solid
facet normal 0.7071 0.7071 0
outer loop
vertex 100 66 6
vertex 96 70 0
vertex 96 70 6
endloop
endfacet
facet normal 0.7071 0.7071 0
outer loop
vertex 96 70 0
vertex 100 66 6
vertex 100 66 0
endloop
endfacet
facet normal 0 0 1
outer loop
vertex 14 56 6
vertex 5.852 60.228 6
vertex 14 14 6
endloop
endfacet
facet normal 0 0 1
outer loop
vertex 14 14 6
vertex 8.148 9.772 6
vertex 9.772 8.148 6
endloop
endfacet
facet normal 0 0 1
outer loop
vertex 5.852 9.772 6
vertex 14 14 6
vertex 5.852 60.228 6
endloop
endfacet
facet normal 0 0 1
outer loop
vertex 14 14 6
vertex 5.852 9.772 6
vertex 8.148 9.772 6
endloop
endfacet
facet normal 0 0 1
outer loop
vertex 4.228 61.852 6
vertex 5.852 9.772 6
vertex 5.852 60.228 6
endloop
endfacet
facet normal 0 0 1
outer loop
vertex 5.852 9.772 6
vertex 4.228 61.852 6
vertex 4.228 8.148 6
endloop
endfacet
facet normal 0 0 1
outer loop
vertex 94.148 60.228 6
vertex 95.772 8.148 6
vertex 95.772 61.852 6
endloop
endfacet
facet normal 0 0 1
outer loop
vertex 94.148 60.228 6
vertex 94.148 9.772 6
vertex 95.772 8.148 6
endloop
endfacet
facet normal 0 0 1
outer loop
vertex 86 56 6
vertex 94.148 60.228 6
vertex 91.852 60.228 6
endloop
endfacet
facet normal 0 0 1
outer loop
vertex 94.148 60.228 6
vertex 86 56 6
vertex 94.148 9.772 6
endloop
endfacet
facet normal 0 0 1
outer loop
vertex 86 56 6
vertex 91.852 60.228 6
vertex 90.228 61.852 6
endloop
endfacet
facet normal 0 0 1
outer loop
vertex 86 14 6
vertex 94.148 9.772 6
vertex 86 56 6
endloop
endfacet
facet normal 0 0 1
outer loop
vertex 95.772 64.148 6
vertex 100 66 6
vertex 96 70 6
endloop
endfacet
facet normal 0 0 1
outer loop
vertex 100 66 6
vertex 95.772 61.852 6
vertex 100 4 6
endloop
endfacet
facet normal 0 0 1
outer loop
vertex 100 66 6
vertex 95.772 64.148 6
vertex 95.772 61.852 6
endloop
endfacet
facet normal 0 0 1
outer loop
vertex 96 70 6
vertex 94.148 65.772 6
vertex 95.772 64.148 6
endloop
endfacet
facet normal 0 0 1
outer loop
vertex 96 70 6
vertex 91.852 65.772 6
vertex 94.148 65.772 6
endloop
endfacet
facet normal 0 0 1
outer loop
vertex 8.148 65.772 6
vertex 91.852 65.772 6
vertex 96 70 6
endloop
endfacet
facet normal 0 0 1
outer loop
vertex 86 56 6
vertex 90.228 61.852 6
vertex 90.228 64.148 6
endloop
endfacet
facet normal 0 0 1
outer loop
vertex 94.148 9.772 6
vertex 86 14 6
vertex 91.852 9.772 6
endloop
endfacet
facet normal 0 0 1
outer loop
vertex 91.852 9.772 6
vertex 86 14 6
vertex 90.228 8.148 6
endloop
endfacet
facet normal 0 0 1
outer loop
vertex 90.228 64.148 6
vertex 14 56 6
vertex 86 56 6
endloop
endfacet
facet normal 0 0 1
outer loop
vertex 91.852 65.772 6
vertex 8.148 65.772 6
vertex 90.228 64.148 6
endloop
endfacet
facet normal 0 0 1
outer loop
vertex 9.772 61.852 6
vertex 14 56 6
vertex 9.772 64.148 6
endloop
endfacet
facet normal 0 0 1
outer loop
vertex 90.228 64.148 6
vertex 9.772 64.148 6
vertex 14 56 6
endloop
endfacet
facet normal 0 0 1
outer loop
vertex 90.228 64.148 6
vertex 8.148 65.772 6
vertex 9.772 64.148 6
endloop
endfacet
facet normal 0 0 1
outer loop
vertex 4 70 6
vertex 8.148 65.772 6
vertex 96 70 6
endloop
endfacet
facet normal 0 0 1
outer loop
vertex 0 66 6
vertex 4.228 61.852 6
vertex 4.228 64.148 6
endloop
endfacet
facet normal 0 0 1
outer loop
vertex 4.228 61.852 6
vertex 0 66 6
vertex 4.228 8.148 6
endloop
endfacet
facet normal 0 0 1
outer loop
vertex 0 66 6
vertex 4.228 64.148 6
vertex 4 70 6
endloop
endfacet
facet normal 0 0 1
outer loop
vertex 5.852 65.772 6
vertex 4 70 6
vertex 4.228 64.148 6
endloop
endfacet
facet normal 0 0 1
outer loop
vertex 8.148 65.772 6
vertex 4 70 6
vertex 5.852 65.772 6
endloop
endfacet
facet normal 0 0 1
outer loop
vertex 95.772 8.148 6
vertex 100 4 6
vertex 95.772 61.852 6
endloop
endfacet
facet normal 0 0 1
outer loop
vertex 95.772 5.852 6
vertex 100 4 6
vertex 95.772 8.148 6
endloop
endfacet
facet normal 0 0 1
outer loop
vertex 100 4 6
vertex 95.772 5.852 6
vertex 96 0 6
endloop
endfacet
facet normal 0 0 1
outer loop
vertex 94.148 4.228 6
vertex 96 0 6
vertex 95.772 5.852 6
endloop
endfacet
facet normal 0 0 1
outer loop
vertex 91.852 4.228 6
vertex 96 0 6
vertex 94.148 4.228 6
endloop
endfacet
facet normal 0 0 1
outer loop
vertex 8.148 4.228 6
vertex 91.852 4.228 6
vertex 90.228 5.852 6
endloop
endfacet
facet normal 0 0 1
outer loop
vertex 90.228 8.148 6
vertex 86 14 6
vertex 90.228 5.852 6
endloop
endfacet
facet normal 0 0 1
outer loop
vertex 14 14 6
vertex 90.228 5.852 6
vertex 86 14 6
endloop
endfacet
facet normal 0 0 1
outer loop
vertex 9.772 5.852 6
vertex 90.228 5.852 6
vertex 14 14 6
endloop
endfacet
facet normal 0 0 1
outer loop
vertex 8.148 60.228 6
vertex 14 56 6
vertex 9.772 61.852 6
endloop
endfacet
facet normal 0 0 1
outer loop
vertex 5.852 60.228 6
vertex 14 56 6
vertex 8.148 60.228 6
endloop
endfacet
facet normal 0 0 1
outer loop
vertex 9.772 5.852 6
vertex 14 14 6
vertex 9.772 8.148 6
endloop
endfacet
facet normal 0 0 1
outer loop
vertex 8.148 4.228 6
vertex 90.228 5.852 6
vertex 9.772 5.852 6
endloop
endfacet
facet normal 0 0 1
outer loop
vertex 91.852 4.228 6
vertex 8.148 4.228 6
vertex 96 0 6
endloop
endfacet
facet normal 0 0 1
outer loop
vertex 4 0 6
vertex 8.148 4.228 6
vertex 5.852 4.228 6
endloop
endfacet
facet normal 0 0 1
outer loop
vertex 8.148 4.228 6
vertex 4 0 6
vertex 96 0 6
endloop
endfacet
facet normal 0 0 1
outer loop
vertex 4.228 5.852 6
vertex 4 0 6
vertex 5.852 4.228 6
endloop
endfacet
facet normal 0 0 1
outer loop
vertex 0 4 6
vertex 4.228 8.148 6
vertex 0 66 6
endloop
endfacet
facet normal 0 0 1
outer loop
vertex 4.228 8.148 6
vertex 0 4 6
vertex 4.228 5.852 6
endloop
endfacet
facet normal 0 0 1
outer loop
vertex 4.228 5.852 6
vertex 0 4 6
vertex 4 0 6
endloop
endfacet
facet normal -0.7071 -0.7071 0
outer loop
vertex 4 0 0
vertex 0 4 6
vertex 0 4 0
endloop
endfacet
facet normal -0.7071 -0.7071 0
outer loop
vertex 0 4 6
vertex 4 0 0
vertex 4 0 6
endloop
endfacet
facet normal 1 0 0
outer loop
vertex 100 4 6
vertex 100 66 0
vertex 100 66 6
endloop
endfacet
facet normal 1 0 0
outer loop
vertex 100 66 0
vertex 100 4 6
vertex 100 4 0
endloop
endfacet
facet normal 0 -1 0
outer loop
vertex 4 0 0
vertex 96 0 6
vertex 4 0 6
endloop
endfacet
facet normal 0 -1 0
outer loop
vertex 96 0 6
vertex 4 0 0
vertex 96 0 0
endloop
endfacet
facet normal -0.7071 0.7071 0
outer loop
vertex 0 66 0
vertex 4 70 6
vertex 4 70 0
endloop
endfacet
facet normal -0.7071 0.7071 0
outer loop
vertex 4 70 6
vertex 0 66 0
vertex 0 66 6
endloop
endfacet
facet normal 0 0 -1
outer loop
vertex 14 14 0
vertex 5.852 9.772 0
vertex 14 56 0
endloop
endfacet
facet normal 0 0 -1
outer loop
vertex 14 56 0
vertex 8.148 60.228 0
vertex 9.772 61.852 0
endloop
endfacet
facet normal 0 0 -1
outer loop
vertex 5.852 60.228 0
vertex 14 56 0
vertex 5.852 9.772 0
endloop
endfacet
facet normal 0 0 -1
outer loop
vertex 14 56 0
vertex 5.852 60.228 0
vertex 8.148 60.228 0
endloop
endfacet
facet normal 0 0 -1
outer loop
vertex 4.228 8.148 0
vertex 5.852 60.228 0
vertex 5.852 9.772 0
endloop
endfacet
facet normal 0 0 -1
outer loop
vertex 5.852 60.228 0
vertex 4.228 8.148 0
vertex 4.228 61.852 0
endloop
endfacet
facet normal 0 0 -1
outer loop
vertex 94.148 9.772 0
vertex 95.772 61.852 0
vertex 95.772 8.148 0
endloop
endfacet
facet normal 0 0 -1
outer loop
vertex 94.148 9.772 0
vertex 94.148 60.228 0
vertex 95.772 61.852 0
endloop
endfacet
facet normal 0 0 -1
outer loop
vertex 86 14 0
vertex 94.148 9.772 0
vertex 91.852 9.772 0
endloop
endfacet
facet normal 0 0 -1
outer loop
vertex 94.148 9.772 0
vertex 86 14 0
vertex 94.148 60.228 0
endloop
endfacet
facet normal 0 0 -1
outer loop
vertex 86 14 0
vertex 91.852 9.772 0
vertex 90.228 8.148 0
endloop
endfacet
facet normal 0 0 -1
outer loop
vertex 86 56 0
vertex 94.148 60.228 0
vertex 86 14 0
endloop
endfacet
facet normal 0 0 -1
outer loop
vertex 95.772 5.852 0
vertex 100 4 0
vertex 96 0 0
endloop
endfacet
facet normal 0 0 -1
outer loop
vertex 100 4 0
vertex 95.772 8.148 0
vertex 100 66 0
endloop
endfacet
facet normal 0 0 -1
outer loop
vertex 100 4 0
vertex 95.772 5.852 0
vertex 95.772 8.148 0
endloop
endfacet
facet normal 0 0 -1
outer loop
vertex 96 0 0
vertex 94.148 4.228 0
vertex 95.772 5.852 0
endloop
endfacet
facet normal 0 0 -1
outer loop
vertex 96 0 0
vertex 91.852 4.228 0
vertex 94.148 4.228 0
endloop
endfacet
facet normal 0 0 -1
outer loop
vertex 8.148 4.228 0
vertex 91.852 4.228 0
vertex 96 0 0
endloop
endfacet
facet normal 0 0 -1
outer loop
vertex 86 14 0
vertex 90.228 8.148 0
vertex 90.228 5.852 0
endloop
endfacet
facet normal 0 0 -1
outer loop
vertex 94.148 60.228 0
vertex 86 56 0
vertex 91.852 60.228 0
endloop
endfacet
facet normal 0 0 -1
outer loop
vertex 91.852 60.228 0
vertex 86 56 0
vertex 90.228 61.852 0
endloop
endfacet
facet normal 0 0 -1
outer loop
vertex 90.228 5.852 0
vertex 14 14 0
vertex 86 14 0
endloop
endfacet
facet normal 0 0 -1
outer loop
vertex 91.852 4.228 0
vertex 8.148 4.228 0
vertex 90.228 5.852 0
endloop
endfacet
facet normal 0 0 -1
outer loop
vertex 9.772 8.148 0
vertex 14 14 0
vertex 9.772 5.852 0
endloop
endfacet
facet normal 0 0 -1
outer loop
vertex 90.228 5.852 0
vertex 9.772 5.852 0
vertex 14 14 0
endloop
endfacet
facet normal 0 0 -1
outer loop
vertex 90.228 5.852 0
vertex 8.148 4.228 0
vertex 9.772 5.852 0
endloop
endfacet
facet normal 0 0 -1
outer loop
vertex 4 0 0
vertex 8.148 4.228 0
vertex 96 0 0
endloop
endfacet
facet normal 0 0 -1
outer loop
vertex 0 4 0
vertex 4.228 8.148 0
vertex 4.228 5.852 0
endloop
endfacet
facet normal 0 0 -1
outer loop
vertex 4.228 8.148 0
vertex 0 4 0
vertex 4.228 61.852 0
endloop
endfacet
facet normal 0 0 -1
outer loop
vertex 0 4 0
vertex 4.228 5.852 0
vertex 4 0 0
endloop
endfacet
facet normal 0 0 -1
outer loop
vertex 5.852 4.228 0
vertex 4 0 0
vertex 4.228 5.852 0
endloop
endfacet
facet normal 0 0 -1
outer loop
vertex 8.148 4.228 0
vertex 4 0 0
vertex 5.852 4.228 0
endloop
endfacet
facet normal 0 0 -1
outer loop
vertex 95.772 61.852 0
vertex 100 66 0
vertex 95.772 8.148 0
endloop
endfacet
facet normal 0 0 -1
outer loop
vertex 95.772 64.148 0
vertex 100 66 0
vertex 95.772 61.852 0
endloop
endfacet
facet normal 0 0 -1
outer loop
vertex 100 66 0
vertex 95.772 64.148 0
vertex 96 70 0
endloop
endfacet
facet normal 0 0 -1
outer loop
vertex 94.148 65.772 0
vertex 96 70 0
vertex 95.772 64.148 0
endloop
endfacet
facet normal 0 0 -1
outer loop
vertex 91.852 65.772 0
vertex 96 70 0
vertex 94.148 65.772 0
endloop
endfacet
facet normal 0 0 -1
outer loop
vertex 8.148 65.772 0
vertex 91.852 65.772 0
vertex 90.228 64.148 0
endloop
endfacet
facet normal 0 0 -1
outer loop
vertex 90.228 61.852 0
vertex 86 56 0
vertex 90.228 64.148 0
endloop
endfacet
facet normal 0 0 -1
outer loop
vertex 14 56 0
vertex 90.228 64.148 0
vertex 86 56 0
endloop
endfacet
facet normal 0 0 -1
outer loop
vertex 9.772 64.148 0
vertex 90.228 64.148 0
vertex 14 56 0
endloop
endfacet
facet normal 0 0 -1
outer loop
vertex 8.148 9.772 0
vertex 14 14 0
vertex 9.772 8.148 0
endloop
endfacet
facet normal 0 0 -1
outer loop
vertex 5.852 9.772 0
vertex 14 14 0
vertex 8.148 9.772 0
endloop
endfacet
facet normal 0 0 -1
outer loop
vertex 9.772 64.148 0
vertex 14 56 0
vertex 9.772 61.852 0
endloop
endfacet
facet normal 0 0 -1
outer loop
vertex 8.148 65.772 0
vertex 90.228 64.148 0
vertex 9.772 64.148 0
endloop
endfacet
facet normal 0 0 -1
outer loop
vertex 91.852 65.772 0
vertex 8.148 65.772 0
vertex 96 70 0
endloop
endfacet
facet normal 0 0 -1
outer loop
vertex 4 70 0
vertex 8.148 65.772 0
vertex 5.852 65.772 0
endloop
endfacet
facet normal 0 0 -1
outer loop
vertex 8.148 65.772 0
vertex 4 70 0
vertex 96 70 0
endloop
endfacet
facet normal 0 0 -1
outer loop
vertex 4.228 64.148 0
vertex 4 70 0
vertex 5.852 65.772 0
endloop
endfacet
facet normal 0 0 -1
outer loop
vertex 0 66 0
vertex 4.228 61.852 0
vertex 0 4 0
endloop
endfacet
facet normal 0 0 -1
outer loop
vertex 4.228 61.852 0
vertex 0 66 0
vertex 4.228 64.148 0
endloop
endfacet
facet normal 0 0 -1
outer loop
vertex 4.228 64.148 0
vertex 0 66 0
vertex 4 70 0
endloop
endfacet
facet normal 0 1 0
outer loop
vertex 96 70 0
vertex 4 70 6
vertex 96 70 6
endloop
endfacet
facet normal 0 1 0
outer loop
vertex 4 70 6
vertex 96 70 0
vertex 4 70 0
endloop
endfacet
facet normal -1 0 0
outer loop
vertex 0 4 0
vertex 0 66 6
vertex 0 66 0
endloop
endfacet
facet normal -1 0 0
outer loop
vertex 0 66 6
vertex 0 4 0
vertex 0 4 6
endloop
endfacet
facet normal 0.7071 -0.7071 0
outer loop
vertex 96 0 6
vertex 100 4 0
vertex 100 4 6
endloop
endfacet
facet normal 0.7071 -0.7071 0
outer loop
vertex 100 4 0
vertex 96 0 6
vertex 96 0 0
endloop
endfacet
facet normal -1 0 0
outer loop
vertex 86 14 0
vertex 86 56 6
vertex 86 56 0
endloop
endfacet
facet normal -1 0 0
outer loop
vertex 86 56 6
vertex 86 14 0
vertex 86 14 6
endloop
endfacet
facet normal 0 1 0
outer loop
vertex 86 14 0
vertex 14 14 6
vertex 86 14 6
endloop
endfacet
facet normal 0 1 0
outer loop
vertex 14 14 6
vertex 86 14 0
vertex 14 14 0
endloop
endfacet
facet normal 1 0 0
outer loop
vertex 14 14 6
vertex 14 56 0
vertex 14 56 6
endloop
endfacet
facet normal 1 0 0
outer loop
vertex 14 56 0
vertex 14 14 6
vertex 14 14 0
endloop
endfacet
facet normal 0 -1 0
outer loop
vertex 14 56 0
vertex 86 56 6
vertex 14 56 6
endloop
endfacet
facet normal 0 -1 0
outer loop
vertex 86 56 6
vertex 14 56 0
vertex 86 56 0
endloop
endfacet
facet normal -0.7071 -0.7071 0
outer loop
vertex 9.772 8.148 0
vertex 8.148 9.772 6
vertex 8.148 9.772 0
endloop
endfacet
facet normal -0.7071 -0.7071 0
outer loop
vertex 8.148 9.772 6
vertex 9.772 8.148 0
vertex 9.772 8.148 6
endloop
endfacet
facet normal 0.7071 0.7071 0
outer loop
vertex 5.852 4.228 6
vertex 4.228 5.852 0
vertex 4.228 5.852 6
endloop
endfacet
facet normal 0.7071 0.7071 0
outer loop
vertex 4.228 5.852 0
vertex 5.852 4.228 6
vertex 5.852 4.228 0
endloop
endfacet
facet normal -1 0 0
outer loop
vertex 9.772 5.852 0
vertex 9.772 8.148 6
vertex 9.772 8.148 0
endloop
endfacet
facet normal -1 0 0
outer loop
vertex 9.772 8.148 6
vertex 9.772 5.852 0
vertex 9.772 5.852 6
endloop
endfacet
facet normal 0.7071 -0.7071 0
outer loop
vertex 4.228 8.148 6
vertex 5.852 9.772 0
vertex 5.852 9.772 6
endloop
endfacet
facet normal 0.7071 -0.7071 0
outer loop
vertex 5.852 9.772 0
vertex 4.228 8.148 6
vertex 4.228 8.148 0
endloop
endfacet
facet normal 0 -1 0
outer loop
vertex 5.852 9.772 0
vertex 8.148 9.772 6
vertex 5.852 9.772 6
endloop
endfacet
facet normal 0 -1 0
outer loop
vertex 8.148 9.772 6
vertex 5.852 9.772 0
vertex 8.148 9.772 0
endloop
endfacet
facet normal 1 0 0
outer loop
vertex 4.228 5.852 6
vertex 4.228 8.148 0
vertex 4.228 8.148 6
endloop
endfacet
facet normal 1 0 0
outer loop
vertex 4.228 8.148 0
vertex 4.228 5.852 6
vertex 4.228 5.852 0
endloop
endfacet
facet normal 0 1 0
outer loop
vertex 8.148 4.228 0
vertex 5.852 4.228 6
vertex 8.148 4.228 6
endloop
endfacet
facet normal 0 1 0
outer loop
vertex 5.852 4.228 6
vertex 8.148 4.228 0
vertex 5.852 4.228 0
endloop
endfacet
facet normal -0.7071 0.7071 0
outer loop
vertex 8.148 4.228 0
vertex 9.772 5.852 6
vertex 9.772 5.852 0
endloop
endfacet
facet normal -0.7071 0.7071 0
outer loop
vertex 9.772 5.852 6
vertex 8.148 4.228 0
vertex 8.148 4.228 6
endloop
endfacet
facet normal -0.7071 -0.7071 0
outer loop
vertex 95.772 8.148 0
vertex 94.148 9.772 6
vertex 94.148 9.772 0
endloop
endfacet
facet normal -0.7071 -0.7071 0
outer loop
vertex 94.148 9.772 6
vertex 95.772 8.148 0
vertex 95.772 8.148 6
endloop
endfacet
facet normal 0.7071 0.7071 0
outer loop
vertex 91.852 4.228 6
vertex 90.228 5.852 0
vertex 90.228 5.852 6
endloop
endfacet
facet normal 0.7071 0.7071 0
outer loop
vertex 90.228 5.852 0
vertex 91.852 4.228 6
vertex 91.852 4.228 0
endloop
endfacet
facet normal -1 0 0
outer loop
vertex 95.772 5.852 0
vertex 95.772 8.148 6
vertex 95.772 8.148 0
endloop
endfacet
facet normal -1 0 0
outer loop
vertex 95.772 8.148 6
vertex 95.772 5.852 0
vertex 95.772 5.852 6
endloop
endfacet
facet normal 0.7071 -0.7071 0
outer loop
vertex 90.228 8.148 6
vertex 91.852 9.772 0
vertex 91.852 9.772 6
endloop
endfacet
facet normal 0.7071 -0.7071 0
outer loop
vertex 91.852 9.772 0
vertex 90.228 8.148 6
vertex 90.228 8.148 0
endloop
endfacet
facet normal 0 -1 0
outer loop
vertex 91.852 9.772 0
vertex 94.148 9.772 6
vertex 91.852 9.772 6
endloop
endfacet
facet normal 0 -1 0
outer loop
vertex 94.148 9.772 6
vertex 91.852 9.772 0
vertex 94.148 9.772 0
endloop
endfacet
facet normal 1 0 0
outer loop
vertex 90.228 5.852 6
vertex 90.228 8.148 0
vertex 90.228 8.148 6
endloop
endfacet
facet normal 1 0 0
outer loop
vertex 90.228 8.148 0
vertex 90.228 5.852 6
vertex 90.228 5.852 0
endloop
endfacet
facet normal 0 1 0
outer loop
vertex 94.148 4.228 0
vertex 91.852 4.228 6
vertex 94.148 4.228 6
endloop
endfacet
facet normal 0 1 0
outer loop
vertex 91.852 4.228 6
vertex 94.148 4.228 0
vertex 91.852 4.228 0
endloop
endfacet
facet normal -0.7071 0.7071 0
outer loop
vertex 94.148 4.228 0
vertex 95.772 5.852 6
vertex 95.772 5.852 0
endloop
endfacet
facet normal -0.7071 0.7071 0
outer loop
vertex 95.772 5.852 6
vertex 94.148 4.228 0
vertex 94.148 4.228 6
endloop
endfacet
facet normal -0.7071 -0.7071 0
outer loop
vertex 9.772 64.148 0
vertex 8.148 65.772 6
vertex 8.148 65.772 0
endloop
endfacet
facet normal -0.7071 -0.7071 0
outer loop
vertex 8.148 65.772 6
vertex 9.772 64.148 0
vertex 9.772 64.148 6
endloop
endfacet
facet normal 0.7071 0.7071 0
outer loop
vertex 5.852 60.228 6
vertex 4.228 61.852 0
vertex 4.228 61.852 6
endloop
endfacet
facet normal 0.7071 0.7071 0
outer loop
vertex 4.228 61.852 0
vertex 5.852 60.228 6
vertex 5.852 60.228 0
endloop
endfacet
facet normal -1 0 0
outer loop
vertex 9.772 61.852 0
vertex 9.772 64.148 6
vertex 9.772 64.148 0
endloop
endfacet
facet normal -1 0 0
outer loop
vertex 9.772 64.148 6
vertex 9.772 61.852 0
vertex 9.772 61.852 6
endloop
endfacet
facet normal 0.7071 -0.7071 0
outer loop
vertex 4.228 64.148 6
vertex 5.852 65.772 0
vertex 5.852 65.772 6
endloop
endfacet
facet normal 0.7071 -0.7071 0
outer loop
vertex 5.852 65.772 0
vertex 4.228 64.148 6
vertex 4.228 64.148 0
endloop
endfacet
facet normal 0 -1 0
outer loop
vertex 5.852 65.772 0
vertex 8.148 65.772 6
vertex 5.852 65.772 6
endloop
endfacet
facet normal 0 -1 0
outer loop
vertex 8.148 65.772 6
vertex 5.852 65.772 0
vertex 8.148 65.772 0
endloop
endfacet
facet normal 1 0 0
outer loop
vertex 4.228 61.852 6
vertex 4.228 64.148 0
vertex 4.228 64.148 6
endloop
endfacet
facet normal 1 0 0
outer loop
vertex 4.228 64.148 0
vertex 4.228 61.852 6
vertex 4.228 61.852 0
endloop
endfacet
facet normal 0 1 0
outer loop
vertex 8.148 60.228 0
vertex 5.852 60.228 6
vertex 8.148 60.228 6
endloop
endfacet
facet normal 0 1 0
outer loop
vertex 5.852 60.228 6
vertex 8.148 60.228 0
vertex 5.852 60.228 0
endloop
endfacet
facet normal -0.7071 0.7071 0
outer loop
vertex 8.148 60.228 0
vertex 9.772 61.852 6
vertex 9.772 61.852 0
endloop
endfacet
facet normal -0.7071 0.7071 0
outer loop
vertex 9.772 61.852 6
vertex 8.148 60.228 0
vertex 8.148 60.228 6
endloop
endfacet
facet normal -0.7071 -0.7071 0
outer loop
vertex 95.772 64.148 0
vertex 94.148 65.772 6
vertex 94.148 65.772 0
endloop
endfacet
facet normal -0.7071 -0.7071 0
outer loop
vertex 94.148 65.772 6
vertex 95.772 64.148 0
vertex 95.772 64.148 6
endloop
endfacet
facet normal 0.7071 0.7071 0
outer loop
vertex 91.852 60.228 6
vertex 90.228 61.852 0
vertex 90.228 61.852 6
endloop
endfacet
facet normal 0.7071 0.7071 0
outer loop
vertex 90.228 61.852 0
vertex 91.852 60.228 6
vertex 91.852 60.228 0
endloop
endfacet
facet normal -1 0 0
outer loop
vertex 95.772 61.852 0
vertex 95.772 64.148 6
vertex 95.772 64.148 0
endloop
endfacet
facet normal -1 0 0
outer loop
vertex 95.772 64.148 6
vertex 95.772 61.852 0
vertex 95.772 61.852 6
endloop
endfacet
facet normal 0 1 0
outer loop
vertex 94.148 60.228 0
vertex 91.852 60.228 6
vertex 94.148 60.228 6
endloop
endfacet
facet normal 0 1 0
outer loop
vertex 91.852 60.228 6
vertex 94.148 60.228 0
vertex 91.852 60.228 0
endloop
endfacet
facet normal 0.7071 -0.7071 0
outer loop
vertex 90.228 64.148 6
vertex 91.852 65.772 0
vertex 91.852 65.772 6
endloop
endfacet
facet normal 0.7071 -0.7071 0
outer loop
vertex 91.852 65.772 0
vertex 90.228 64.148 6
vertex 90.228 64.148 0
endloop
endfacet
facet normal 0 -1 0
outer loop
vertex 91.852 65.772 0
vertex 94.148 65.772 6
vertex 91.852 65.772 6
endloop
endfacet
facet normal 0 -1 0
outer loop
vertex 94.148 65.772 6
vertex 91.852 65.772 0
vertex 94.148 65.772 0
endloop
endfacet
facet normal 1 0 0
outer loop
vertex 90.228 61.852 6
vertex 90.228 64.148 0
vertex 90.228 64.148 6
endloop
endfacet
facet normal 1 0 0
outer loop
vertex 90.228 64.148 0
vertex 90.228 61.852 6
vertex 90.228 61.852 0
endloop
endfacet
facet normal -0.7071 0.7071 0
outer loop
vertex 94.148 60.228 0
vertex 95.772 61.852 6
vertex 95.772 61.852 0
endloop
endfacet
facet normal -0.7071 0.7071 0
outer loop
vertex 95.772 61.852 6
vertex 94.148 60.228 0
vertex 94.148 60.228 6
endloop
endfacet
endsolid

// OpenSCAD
$fn = 32;

// ----------------------------------------------------------------------
// Frame plate: 100 x 70 frame, 14 mm rails
// ----------------------------------------------------------------------

// --- parameters (mm) ---
plate_l = 100;            // plate length, X
plate_w = 70;             // plate width, Y
plate_t = 6;              // plate thickness, Z (extrusion height)
corner_c = 4;             // corner chamfer
frame_bar = 14;           // frame rail width
bolt_r = 3;               // corner bolt window radius
bolt_inset = 7;           // bolt centre inset from the edges

win_l = plate_l - 2 * frame_bar;  // window length
win_w = plate_w - 2 * frame_bar;  // window width
bolt_d = 2 * bolt_r;  // corner hole diameter

profile = [[4, 0], [96, 0], [100, 4], [100, 66], [96, 70], [4, 70], [0, 66], [0, 4]];  // primary outline, 8 points, counter clockwise
void_1 = [[14, 14], [86, 14], [86, 56], [14, 56]];  // the window, 4 points
void_2 = [[9.772, 8.148], [8.148, 9.772], [5.852, 9.772], [4.228, 8.148], [4.228, 5.852], [5.852, 4.228], [8.148, 4.228], [9.772, 5.852]];  // corner bolt window, 8 points
void_3 = [[95.772, 8.148], [94.148, 9.772], [91.852, 9.772], [90.228, 8.148], [90.228, 5.852], [91.852, 4.228], [94.148, 4.228], [95.772, 5.852]];  // corner bolt window, 8 points
void_4 = [[9.772, 64.148], [8.148, 65.772], [5.852, 65.772], [4.228, 64.148], [4.228, 61.852], [5.852, 60.228], [8.148, 60.228], [9.772, 61.852]];  // corner bolt window, 8 points
void_5 = [[95.772, 64.148], [94.148, 65.772], [91.852, 65.772], [90.228, 64.148], [90.228, 61.852], [91.852, 60.228], [94.148, 60.228], [95.772, 61.852]];  // corner bolt window, 8 points

// --- the one profile operation ---
difference() {
  linear_extrude(height = plate_t) polygon(points = profile);
  translate([0, 0, -1])
    linear_extrude(height = plate_t + 2) polygon(points = void_1);
  translate([0, 0, -1])
    linear_extrude(height = plate_t + 2) polygon(points = void_2);
  translate([0, 0, -1])
    linear_extrude(height = plate_t + 2) polygon(points = void_3);
  translate([0, 0, -1])
    linear_extrude(height = plate_t + 2) polygon(points = void_4);
  translate([0, 0, -1])
    linear_extrude(height = plate_t + 2) polygon(points = void_5);
}
